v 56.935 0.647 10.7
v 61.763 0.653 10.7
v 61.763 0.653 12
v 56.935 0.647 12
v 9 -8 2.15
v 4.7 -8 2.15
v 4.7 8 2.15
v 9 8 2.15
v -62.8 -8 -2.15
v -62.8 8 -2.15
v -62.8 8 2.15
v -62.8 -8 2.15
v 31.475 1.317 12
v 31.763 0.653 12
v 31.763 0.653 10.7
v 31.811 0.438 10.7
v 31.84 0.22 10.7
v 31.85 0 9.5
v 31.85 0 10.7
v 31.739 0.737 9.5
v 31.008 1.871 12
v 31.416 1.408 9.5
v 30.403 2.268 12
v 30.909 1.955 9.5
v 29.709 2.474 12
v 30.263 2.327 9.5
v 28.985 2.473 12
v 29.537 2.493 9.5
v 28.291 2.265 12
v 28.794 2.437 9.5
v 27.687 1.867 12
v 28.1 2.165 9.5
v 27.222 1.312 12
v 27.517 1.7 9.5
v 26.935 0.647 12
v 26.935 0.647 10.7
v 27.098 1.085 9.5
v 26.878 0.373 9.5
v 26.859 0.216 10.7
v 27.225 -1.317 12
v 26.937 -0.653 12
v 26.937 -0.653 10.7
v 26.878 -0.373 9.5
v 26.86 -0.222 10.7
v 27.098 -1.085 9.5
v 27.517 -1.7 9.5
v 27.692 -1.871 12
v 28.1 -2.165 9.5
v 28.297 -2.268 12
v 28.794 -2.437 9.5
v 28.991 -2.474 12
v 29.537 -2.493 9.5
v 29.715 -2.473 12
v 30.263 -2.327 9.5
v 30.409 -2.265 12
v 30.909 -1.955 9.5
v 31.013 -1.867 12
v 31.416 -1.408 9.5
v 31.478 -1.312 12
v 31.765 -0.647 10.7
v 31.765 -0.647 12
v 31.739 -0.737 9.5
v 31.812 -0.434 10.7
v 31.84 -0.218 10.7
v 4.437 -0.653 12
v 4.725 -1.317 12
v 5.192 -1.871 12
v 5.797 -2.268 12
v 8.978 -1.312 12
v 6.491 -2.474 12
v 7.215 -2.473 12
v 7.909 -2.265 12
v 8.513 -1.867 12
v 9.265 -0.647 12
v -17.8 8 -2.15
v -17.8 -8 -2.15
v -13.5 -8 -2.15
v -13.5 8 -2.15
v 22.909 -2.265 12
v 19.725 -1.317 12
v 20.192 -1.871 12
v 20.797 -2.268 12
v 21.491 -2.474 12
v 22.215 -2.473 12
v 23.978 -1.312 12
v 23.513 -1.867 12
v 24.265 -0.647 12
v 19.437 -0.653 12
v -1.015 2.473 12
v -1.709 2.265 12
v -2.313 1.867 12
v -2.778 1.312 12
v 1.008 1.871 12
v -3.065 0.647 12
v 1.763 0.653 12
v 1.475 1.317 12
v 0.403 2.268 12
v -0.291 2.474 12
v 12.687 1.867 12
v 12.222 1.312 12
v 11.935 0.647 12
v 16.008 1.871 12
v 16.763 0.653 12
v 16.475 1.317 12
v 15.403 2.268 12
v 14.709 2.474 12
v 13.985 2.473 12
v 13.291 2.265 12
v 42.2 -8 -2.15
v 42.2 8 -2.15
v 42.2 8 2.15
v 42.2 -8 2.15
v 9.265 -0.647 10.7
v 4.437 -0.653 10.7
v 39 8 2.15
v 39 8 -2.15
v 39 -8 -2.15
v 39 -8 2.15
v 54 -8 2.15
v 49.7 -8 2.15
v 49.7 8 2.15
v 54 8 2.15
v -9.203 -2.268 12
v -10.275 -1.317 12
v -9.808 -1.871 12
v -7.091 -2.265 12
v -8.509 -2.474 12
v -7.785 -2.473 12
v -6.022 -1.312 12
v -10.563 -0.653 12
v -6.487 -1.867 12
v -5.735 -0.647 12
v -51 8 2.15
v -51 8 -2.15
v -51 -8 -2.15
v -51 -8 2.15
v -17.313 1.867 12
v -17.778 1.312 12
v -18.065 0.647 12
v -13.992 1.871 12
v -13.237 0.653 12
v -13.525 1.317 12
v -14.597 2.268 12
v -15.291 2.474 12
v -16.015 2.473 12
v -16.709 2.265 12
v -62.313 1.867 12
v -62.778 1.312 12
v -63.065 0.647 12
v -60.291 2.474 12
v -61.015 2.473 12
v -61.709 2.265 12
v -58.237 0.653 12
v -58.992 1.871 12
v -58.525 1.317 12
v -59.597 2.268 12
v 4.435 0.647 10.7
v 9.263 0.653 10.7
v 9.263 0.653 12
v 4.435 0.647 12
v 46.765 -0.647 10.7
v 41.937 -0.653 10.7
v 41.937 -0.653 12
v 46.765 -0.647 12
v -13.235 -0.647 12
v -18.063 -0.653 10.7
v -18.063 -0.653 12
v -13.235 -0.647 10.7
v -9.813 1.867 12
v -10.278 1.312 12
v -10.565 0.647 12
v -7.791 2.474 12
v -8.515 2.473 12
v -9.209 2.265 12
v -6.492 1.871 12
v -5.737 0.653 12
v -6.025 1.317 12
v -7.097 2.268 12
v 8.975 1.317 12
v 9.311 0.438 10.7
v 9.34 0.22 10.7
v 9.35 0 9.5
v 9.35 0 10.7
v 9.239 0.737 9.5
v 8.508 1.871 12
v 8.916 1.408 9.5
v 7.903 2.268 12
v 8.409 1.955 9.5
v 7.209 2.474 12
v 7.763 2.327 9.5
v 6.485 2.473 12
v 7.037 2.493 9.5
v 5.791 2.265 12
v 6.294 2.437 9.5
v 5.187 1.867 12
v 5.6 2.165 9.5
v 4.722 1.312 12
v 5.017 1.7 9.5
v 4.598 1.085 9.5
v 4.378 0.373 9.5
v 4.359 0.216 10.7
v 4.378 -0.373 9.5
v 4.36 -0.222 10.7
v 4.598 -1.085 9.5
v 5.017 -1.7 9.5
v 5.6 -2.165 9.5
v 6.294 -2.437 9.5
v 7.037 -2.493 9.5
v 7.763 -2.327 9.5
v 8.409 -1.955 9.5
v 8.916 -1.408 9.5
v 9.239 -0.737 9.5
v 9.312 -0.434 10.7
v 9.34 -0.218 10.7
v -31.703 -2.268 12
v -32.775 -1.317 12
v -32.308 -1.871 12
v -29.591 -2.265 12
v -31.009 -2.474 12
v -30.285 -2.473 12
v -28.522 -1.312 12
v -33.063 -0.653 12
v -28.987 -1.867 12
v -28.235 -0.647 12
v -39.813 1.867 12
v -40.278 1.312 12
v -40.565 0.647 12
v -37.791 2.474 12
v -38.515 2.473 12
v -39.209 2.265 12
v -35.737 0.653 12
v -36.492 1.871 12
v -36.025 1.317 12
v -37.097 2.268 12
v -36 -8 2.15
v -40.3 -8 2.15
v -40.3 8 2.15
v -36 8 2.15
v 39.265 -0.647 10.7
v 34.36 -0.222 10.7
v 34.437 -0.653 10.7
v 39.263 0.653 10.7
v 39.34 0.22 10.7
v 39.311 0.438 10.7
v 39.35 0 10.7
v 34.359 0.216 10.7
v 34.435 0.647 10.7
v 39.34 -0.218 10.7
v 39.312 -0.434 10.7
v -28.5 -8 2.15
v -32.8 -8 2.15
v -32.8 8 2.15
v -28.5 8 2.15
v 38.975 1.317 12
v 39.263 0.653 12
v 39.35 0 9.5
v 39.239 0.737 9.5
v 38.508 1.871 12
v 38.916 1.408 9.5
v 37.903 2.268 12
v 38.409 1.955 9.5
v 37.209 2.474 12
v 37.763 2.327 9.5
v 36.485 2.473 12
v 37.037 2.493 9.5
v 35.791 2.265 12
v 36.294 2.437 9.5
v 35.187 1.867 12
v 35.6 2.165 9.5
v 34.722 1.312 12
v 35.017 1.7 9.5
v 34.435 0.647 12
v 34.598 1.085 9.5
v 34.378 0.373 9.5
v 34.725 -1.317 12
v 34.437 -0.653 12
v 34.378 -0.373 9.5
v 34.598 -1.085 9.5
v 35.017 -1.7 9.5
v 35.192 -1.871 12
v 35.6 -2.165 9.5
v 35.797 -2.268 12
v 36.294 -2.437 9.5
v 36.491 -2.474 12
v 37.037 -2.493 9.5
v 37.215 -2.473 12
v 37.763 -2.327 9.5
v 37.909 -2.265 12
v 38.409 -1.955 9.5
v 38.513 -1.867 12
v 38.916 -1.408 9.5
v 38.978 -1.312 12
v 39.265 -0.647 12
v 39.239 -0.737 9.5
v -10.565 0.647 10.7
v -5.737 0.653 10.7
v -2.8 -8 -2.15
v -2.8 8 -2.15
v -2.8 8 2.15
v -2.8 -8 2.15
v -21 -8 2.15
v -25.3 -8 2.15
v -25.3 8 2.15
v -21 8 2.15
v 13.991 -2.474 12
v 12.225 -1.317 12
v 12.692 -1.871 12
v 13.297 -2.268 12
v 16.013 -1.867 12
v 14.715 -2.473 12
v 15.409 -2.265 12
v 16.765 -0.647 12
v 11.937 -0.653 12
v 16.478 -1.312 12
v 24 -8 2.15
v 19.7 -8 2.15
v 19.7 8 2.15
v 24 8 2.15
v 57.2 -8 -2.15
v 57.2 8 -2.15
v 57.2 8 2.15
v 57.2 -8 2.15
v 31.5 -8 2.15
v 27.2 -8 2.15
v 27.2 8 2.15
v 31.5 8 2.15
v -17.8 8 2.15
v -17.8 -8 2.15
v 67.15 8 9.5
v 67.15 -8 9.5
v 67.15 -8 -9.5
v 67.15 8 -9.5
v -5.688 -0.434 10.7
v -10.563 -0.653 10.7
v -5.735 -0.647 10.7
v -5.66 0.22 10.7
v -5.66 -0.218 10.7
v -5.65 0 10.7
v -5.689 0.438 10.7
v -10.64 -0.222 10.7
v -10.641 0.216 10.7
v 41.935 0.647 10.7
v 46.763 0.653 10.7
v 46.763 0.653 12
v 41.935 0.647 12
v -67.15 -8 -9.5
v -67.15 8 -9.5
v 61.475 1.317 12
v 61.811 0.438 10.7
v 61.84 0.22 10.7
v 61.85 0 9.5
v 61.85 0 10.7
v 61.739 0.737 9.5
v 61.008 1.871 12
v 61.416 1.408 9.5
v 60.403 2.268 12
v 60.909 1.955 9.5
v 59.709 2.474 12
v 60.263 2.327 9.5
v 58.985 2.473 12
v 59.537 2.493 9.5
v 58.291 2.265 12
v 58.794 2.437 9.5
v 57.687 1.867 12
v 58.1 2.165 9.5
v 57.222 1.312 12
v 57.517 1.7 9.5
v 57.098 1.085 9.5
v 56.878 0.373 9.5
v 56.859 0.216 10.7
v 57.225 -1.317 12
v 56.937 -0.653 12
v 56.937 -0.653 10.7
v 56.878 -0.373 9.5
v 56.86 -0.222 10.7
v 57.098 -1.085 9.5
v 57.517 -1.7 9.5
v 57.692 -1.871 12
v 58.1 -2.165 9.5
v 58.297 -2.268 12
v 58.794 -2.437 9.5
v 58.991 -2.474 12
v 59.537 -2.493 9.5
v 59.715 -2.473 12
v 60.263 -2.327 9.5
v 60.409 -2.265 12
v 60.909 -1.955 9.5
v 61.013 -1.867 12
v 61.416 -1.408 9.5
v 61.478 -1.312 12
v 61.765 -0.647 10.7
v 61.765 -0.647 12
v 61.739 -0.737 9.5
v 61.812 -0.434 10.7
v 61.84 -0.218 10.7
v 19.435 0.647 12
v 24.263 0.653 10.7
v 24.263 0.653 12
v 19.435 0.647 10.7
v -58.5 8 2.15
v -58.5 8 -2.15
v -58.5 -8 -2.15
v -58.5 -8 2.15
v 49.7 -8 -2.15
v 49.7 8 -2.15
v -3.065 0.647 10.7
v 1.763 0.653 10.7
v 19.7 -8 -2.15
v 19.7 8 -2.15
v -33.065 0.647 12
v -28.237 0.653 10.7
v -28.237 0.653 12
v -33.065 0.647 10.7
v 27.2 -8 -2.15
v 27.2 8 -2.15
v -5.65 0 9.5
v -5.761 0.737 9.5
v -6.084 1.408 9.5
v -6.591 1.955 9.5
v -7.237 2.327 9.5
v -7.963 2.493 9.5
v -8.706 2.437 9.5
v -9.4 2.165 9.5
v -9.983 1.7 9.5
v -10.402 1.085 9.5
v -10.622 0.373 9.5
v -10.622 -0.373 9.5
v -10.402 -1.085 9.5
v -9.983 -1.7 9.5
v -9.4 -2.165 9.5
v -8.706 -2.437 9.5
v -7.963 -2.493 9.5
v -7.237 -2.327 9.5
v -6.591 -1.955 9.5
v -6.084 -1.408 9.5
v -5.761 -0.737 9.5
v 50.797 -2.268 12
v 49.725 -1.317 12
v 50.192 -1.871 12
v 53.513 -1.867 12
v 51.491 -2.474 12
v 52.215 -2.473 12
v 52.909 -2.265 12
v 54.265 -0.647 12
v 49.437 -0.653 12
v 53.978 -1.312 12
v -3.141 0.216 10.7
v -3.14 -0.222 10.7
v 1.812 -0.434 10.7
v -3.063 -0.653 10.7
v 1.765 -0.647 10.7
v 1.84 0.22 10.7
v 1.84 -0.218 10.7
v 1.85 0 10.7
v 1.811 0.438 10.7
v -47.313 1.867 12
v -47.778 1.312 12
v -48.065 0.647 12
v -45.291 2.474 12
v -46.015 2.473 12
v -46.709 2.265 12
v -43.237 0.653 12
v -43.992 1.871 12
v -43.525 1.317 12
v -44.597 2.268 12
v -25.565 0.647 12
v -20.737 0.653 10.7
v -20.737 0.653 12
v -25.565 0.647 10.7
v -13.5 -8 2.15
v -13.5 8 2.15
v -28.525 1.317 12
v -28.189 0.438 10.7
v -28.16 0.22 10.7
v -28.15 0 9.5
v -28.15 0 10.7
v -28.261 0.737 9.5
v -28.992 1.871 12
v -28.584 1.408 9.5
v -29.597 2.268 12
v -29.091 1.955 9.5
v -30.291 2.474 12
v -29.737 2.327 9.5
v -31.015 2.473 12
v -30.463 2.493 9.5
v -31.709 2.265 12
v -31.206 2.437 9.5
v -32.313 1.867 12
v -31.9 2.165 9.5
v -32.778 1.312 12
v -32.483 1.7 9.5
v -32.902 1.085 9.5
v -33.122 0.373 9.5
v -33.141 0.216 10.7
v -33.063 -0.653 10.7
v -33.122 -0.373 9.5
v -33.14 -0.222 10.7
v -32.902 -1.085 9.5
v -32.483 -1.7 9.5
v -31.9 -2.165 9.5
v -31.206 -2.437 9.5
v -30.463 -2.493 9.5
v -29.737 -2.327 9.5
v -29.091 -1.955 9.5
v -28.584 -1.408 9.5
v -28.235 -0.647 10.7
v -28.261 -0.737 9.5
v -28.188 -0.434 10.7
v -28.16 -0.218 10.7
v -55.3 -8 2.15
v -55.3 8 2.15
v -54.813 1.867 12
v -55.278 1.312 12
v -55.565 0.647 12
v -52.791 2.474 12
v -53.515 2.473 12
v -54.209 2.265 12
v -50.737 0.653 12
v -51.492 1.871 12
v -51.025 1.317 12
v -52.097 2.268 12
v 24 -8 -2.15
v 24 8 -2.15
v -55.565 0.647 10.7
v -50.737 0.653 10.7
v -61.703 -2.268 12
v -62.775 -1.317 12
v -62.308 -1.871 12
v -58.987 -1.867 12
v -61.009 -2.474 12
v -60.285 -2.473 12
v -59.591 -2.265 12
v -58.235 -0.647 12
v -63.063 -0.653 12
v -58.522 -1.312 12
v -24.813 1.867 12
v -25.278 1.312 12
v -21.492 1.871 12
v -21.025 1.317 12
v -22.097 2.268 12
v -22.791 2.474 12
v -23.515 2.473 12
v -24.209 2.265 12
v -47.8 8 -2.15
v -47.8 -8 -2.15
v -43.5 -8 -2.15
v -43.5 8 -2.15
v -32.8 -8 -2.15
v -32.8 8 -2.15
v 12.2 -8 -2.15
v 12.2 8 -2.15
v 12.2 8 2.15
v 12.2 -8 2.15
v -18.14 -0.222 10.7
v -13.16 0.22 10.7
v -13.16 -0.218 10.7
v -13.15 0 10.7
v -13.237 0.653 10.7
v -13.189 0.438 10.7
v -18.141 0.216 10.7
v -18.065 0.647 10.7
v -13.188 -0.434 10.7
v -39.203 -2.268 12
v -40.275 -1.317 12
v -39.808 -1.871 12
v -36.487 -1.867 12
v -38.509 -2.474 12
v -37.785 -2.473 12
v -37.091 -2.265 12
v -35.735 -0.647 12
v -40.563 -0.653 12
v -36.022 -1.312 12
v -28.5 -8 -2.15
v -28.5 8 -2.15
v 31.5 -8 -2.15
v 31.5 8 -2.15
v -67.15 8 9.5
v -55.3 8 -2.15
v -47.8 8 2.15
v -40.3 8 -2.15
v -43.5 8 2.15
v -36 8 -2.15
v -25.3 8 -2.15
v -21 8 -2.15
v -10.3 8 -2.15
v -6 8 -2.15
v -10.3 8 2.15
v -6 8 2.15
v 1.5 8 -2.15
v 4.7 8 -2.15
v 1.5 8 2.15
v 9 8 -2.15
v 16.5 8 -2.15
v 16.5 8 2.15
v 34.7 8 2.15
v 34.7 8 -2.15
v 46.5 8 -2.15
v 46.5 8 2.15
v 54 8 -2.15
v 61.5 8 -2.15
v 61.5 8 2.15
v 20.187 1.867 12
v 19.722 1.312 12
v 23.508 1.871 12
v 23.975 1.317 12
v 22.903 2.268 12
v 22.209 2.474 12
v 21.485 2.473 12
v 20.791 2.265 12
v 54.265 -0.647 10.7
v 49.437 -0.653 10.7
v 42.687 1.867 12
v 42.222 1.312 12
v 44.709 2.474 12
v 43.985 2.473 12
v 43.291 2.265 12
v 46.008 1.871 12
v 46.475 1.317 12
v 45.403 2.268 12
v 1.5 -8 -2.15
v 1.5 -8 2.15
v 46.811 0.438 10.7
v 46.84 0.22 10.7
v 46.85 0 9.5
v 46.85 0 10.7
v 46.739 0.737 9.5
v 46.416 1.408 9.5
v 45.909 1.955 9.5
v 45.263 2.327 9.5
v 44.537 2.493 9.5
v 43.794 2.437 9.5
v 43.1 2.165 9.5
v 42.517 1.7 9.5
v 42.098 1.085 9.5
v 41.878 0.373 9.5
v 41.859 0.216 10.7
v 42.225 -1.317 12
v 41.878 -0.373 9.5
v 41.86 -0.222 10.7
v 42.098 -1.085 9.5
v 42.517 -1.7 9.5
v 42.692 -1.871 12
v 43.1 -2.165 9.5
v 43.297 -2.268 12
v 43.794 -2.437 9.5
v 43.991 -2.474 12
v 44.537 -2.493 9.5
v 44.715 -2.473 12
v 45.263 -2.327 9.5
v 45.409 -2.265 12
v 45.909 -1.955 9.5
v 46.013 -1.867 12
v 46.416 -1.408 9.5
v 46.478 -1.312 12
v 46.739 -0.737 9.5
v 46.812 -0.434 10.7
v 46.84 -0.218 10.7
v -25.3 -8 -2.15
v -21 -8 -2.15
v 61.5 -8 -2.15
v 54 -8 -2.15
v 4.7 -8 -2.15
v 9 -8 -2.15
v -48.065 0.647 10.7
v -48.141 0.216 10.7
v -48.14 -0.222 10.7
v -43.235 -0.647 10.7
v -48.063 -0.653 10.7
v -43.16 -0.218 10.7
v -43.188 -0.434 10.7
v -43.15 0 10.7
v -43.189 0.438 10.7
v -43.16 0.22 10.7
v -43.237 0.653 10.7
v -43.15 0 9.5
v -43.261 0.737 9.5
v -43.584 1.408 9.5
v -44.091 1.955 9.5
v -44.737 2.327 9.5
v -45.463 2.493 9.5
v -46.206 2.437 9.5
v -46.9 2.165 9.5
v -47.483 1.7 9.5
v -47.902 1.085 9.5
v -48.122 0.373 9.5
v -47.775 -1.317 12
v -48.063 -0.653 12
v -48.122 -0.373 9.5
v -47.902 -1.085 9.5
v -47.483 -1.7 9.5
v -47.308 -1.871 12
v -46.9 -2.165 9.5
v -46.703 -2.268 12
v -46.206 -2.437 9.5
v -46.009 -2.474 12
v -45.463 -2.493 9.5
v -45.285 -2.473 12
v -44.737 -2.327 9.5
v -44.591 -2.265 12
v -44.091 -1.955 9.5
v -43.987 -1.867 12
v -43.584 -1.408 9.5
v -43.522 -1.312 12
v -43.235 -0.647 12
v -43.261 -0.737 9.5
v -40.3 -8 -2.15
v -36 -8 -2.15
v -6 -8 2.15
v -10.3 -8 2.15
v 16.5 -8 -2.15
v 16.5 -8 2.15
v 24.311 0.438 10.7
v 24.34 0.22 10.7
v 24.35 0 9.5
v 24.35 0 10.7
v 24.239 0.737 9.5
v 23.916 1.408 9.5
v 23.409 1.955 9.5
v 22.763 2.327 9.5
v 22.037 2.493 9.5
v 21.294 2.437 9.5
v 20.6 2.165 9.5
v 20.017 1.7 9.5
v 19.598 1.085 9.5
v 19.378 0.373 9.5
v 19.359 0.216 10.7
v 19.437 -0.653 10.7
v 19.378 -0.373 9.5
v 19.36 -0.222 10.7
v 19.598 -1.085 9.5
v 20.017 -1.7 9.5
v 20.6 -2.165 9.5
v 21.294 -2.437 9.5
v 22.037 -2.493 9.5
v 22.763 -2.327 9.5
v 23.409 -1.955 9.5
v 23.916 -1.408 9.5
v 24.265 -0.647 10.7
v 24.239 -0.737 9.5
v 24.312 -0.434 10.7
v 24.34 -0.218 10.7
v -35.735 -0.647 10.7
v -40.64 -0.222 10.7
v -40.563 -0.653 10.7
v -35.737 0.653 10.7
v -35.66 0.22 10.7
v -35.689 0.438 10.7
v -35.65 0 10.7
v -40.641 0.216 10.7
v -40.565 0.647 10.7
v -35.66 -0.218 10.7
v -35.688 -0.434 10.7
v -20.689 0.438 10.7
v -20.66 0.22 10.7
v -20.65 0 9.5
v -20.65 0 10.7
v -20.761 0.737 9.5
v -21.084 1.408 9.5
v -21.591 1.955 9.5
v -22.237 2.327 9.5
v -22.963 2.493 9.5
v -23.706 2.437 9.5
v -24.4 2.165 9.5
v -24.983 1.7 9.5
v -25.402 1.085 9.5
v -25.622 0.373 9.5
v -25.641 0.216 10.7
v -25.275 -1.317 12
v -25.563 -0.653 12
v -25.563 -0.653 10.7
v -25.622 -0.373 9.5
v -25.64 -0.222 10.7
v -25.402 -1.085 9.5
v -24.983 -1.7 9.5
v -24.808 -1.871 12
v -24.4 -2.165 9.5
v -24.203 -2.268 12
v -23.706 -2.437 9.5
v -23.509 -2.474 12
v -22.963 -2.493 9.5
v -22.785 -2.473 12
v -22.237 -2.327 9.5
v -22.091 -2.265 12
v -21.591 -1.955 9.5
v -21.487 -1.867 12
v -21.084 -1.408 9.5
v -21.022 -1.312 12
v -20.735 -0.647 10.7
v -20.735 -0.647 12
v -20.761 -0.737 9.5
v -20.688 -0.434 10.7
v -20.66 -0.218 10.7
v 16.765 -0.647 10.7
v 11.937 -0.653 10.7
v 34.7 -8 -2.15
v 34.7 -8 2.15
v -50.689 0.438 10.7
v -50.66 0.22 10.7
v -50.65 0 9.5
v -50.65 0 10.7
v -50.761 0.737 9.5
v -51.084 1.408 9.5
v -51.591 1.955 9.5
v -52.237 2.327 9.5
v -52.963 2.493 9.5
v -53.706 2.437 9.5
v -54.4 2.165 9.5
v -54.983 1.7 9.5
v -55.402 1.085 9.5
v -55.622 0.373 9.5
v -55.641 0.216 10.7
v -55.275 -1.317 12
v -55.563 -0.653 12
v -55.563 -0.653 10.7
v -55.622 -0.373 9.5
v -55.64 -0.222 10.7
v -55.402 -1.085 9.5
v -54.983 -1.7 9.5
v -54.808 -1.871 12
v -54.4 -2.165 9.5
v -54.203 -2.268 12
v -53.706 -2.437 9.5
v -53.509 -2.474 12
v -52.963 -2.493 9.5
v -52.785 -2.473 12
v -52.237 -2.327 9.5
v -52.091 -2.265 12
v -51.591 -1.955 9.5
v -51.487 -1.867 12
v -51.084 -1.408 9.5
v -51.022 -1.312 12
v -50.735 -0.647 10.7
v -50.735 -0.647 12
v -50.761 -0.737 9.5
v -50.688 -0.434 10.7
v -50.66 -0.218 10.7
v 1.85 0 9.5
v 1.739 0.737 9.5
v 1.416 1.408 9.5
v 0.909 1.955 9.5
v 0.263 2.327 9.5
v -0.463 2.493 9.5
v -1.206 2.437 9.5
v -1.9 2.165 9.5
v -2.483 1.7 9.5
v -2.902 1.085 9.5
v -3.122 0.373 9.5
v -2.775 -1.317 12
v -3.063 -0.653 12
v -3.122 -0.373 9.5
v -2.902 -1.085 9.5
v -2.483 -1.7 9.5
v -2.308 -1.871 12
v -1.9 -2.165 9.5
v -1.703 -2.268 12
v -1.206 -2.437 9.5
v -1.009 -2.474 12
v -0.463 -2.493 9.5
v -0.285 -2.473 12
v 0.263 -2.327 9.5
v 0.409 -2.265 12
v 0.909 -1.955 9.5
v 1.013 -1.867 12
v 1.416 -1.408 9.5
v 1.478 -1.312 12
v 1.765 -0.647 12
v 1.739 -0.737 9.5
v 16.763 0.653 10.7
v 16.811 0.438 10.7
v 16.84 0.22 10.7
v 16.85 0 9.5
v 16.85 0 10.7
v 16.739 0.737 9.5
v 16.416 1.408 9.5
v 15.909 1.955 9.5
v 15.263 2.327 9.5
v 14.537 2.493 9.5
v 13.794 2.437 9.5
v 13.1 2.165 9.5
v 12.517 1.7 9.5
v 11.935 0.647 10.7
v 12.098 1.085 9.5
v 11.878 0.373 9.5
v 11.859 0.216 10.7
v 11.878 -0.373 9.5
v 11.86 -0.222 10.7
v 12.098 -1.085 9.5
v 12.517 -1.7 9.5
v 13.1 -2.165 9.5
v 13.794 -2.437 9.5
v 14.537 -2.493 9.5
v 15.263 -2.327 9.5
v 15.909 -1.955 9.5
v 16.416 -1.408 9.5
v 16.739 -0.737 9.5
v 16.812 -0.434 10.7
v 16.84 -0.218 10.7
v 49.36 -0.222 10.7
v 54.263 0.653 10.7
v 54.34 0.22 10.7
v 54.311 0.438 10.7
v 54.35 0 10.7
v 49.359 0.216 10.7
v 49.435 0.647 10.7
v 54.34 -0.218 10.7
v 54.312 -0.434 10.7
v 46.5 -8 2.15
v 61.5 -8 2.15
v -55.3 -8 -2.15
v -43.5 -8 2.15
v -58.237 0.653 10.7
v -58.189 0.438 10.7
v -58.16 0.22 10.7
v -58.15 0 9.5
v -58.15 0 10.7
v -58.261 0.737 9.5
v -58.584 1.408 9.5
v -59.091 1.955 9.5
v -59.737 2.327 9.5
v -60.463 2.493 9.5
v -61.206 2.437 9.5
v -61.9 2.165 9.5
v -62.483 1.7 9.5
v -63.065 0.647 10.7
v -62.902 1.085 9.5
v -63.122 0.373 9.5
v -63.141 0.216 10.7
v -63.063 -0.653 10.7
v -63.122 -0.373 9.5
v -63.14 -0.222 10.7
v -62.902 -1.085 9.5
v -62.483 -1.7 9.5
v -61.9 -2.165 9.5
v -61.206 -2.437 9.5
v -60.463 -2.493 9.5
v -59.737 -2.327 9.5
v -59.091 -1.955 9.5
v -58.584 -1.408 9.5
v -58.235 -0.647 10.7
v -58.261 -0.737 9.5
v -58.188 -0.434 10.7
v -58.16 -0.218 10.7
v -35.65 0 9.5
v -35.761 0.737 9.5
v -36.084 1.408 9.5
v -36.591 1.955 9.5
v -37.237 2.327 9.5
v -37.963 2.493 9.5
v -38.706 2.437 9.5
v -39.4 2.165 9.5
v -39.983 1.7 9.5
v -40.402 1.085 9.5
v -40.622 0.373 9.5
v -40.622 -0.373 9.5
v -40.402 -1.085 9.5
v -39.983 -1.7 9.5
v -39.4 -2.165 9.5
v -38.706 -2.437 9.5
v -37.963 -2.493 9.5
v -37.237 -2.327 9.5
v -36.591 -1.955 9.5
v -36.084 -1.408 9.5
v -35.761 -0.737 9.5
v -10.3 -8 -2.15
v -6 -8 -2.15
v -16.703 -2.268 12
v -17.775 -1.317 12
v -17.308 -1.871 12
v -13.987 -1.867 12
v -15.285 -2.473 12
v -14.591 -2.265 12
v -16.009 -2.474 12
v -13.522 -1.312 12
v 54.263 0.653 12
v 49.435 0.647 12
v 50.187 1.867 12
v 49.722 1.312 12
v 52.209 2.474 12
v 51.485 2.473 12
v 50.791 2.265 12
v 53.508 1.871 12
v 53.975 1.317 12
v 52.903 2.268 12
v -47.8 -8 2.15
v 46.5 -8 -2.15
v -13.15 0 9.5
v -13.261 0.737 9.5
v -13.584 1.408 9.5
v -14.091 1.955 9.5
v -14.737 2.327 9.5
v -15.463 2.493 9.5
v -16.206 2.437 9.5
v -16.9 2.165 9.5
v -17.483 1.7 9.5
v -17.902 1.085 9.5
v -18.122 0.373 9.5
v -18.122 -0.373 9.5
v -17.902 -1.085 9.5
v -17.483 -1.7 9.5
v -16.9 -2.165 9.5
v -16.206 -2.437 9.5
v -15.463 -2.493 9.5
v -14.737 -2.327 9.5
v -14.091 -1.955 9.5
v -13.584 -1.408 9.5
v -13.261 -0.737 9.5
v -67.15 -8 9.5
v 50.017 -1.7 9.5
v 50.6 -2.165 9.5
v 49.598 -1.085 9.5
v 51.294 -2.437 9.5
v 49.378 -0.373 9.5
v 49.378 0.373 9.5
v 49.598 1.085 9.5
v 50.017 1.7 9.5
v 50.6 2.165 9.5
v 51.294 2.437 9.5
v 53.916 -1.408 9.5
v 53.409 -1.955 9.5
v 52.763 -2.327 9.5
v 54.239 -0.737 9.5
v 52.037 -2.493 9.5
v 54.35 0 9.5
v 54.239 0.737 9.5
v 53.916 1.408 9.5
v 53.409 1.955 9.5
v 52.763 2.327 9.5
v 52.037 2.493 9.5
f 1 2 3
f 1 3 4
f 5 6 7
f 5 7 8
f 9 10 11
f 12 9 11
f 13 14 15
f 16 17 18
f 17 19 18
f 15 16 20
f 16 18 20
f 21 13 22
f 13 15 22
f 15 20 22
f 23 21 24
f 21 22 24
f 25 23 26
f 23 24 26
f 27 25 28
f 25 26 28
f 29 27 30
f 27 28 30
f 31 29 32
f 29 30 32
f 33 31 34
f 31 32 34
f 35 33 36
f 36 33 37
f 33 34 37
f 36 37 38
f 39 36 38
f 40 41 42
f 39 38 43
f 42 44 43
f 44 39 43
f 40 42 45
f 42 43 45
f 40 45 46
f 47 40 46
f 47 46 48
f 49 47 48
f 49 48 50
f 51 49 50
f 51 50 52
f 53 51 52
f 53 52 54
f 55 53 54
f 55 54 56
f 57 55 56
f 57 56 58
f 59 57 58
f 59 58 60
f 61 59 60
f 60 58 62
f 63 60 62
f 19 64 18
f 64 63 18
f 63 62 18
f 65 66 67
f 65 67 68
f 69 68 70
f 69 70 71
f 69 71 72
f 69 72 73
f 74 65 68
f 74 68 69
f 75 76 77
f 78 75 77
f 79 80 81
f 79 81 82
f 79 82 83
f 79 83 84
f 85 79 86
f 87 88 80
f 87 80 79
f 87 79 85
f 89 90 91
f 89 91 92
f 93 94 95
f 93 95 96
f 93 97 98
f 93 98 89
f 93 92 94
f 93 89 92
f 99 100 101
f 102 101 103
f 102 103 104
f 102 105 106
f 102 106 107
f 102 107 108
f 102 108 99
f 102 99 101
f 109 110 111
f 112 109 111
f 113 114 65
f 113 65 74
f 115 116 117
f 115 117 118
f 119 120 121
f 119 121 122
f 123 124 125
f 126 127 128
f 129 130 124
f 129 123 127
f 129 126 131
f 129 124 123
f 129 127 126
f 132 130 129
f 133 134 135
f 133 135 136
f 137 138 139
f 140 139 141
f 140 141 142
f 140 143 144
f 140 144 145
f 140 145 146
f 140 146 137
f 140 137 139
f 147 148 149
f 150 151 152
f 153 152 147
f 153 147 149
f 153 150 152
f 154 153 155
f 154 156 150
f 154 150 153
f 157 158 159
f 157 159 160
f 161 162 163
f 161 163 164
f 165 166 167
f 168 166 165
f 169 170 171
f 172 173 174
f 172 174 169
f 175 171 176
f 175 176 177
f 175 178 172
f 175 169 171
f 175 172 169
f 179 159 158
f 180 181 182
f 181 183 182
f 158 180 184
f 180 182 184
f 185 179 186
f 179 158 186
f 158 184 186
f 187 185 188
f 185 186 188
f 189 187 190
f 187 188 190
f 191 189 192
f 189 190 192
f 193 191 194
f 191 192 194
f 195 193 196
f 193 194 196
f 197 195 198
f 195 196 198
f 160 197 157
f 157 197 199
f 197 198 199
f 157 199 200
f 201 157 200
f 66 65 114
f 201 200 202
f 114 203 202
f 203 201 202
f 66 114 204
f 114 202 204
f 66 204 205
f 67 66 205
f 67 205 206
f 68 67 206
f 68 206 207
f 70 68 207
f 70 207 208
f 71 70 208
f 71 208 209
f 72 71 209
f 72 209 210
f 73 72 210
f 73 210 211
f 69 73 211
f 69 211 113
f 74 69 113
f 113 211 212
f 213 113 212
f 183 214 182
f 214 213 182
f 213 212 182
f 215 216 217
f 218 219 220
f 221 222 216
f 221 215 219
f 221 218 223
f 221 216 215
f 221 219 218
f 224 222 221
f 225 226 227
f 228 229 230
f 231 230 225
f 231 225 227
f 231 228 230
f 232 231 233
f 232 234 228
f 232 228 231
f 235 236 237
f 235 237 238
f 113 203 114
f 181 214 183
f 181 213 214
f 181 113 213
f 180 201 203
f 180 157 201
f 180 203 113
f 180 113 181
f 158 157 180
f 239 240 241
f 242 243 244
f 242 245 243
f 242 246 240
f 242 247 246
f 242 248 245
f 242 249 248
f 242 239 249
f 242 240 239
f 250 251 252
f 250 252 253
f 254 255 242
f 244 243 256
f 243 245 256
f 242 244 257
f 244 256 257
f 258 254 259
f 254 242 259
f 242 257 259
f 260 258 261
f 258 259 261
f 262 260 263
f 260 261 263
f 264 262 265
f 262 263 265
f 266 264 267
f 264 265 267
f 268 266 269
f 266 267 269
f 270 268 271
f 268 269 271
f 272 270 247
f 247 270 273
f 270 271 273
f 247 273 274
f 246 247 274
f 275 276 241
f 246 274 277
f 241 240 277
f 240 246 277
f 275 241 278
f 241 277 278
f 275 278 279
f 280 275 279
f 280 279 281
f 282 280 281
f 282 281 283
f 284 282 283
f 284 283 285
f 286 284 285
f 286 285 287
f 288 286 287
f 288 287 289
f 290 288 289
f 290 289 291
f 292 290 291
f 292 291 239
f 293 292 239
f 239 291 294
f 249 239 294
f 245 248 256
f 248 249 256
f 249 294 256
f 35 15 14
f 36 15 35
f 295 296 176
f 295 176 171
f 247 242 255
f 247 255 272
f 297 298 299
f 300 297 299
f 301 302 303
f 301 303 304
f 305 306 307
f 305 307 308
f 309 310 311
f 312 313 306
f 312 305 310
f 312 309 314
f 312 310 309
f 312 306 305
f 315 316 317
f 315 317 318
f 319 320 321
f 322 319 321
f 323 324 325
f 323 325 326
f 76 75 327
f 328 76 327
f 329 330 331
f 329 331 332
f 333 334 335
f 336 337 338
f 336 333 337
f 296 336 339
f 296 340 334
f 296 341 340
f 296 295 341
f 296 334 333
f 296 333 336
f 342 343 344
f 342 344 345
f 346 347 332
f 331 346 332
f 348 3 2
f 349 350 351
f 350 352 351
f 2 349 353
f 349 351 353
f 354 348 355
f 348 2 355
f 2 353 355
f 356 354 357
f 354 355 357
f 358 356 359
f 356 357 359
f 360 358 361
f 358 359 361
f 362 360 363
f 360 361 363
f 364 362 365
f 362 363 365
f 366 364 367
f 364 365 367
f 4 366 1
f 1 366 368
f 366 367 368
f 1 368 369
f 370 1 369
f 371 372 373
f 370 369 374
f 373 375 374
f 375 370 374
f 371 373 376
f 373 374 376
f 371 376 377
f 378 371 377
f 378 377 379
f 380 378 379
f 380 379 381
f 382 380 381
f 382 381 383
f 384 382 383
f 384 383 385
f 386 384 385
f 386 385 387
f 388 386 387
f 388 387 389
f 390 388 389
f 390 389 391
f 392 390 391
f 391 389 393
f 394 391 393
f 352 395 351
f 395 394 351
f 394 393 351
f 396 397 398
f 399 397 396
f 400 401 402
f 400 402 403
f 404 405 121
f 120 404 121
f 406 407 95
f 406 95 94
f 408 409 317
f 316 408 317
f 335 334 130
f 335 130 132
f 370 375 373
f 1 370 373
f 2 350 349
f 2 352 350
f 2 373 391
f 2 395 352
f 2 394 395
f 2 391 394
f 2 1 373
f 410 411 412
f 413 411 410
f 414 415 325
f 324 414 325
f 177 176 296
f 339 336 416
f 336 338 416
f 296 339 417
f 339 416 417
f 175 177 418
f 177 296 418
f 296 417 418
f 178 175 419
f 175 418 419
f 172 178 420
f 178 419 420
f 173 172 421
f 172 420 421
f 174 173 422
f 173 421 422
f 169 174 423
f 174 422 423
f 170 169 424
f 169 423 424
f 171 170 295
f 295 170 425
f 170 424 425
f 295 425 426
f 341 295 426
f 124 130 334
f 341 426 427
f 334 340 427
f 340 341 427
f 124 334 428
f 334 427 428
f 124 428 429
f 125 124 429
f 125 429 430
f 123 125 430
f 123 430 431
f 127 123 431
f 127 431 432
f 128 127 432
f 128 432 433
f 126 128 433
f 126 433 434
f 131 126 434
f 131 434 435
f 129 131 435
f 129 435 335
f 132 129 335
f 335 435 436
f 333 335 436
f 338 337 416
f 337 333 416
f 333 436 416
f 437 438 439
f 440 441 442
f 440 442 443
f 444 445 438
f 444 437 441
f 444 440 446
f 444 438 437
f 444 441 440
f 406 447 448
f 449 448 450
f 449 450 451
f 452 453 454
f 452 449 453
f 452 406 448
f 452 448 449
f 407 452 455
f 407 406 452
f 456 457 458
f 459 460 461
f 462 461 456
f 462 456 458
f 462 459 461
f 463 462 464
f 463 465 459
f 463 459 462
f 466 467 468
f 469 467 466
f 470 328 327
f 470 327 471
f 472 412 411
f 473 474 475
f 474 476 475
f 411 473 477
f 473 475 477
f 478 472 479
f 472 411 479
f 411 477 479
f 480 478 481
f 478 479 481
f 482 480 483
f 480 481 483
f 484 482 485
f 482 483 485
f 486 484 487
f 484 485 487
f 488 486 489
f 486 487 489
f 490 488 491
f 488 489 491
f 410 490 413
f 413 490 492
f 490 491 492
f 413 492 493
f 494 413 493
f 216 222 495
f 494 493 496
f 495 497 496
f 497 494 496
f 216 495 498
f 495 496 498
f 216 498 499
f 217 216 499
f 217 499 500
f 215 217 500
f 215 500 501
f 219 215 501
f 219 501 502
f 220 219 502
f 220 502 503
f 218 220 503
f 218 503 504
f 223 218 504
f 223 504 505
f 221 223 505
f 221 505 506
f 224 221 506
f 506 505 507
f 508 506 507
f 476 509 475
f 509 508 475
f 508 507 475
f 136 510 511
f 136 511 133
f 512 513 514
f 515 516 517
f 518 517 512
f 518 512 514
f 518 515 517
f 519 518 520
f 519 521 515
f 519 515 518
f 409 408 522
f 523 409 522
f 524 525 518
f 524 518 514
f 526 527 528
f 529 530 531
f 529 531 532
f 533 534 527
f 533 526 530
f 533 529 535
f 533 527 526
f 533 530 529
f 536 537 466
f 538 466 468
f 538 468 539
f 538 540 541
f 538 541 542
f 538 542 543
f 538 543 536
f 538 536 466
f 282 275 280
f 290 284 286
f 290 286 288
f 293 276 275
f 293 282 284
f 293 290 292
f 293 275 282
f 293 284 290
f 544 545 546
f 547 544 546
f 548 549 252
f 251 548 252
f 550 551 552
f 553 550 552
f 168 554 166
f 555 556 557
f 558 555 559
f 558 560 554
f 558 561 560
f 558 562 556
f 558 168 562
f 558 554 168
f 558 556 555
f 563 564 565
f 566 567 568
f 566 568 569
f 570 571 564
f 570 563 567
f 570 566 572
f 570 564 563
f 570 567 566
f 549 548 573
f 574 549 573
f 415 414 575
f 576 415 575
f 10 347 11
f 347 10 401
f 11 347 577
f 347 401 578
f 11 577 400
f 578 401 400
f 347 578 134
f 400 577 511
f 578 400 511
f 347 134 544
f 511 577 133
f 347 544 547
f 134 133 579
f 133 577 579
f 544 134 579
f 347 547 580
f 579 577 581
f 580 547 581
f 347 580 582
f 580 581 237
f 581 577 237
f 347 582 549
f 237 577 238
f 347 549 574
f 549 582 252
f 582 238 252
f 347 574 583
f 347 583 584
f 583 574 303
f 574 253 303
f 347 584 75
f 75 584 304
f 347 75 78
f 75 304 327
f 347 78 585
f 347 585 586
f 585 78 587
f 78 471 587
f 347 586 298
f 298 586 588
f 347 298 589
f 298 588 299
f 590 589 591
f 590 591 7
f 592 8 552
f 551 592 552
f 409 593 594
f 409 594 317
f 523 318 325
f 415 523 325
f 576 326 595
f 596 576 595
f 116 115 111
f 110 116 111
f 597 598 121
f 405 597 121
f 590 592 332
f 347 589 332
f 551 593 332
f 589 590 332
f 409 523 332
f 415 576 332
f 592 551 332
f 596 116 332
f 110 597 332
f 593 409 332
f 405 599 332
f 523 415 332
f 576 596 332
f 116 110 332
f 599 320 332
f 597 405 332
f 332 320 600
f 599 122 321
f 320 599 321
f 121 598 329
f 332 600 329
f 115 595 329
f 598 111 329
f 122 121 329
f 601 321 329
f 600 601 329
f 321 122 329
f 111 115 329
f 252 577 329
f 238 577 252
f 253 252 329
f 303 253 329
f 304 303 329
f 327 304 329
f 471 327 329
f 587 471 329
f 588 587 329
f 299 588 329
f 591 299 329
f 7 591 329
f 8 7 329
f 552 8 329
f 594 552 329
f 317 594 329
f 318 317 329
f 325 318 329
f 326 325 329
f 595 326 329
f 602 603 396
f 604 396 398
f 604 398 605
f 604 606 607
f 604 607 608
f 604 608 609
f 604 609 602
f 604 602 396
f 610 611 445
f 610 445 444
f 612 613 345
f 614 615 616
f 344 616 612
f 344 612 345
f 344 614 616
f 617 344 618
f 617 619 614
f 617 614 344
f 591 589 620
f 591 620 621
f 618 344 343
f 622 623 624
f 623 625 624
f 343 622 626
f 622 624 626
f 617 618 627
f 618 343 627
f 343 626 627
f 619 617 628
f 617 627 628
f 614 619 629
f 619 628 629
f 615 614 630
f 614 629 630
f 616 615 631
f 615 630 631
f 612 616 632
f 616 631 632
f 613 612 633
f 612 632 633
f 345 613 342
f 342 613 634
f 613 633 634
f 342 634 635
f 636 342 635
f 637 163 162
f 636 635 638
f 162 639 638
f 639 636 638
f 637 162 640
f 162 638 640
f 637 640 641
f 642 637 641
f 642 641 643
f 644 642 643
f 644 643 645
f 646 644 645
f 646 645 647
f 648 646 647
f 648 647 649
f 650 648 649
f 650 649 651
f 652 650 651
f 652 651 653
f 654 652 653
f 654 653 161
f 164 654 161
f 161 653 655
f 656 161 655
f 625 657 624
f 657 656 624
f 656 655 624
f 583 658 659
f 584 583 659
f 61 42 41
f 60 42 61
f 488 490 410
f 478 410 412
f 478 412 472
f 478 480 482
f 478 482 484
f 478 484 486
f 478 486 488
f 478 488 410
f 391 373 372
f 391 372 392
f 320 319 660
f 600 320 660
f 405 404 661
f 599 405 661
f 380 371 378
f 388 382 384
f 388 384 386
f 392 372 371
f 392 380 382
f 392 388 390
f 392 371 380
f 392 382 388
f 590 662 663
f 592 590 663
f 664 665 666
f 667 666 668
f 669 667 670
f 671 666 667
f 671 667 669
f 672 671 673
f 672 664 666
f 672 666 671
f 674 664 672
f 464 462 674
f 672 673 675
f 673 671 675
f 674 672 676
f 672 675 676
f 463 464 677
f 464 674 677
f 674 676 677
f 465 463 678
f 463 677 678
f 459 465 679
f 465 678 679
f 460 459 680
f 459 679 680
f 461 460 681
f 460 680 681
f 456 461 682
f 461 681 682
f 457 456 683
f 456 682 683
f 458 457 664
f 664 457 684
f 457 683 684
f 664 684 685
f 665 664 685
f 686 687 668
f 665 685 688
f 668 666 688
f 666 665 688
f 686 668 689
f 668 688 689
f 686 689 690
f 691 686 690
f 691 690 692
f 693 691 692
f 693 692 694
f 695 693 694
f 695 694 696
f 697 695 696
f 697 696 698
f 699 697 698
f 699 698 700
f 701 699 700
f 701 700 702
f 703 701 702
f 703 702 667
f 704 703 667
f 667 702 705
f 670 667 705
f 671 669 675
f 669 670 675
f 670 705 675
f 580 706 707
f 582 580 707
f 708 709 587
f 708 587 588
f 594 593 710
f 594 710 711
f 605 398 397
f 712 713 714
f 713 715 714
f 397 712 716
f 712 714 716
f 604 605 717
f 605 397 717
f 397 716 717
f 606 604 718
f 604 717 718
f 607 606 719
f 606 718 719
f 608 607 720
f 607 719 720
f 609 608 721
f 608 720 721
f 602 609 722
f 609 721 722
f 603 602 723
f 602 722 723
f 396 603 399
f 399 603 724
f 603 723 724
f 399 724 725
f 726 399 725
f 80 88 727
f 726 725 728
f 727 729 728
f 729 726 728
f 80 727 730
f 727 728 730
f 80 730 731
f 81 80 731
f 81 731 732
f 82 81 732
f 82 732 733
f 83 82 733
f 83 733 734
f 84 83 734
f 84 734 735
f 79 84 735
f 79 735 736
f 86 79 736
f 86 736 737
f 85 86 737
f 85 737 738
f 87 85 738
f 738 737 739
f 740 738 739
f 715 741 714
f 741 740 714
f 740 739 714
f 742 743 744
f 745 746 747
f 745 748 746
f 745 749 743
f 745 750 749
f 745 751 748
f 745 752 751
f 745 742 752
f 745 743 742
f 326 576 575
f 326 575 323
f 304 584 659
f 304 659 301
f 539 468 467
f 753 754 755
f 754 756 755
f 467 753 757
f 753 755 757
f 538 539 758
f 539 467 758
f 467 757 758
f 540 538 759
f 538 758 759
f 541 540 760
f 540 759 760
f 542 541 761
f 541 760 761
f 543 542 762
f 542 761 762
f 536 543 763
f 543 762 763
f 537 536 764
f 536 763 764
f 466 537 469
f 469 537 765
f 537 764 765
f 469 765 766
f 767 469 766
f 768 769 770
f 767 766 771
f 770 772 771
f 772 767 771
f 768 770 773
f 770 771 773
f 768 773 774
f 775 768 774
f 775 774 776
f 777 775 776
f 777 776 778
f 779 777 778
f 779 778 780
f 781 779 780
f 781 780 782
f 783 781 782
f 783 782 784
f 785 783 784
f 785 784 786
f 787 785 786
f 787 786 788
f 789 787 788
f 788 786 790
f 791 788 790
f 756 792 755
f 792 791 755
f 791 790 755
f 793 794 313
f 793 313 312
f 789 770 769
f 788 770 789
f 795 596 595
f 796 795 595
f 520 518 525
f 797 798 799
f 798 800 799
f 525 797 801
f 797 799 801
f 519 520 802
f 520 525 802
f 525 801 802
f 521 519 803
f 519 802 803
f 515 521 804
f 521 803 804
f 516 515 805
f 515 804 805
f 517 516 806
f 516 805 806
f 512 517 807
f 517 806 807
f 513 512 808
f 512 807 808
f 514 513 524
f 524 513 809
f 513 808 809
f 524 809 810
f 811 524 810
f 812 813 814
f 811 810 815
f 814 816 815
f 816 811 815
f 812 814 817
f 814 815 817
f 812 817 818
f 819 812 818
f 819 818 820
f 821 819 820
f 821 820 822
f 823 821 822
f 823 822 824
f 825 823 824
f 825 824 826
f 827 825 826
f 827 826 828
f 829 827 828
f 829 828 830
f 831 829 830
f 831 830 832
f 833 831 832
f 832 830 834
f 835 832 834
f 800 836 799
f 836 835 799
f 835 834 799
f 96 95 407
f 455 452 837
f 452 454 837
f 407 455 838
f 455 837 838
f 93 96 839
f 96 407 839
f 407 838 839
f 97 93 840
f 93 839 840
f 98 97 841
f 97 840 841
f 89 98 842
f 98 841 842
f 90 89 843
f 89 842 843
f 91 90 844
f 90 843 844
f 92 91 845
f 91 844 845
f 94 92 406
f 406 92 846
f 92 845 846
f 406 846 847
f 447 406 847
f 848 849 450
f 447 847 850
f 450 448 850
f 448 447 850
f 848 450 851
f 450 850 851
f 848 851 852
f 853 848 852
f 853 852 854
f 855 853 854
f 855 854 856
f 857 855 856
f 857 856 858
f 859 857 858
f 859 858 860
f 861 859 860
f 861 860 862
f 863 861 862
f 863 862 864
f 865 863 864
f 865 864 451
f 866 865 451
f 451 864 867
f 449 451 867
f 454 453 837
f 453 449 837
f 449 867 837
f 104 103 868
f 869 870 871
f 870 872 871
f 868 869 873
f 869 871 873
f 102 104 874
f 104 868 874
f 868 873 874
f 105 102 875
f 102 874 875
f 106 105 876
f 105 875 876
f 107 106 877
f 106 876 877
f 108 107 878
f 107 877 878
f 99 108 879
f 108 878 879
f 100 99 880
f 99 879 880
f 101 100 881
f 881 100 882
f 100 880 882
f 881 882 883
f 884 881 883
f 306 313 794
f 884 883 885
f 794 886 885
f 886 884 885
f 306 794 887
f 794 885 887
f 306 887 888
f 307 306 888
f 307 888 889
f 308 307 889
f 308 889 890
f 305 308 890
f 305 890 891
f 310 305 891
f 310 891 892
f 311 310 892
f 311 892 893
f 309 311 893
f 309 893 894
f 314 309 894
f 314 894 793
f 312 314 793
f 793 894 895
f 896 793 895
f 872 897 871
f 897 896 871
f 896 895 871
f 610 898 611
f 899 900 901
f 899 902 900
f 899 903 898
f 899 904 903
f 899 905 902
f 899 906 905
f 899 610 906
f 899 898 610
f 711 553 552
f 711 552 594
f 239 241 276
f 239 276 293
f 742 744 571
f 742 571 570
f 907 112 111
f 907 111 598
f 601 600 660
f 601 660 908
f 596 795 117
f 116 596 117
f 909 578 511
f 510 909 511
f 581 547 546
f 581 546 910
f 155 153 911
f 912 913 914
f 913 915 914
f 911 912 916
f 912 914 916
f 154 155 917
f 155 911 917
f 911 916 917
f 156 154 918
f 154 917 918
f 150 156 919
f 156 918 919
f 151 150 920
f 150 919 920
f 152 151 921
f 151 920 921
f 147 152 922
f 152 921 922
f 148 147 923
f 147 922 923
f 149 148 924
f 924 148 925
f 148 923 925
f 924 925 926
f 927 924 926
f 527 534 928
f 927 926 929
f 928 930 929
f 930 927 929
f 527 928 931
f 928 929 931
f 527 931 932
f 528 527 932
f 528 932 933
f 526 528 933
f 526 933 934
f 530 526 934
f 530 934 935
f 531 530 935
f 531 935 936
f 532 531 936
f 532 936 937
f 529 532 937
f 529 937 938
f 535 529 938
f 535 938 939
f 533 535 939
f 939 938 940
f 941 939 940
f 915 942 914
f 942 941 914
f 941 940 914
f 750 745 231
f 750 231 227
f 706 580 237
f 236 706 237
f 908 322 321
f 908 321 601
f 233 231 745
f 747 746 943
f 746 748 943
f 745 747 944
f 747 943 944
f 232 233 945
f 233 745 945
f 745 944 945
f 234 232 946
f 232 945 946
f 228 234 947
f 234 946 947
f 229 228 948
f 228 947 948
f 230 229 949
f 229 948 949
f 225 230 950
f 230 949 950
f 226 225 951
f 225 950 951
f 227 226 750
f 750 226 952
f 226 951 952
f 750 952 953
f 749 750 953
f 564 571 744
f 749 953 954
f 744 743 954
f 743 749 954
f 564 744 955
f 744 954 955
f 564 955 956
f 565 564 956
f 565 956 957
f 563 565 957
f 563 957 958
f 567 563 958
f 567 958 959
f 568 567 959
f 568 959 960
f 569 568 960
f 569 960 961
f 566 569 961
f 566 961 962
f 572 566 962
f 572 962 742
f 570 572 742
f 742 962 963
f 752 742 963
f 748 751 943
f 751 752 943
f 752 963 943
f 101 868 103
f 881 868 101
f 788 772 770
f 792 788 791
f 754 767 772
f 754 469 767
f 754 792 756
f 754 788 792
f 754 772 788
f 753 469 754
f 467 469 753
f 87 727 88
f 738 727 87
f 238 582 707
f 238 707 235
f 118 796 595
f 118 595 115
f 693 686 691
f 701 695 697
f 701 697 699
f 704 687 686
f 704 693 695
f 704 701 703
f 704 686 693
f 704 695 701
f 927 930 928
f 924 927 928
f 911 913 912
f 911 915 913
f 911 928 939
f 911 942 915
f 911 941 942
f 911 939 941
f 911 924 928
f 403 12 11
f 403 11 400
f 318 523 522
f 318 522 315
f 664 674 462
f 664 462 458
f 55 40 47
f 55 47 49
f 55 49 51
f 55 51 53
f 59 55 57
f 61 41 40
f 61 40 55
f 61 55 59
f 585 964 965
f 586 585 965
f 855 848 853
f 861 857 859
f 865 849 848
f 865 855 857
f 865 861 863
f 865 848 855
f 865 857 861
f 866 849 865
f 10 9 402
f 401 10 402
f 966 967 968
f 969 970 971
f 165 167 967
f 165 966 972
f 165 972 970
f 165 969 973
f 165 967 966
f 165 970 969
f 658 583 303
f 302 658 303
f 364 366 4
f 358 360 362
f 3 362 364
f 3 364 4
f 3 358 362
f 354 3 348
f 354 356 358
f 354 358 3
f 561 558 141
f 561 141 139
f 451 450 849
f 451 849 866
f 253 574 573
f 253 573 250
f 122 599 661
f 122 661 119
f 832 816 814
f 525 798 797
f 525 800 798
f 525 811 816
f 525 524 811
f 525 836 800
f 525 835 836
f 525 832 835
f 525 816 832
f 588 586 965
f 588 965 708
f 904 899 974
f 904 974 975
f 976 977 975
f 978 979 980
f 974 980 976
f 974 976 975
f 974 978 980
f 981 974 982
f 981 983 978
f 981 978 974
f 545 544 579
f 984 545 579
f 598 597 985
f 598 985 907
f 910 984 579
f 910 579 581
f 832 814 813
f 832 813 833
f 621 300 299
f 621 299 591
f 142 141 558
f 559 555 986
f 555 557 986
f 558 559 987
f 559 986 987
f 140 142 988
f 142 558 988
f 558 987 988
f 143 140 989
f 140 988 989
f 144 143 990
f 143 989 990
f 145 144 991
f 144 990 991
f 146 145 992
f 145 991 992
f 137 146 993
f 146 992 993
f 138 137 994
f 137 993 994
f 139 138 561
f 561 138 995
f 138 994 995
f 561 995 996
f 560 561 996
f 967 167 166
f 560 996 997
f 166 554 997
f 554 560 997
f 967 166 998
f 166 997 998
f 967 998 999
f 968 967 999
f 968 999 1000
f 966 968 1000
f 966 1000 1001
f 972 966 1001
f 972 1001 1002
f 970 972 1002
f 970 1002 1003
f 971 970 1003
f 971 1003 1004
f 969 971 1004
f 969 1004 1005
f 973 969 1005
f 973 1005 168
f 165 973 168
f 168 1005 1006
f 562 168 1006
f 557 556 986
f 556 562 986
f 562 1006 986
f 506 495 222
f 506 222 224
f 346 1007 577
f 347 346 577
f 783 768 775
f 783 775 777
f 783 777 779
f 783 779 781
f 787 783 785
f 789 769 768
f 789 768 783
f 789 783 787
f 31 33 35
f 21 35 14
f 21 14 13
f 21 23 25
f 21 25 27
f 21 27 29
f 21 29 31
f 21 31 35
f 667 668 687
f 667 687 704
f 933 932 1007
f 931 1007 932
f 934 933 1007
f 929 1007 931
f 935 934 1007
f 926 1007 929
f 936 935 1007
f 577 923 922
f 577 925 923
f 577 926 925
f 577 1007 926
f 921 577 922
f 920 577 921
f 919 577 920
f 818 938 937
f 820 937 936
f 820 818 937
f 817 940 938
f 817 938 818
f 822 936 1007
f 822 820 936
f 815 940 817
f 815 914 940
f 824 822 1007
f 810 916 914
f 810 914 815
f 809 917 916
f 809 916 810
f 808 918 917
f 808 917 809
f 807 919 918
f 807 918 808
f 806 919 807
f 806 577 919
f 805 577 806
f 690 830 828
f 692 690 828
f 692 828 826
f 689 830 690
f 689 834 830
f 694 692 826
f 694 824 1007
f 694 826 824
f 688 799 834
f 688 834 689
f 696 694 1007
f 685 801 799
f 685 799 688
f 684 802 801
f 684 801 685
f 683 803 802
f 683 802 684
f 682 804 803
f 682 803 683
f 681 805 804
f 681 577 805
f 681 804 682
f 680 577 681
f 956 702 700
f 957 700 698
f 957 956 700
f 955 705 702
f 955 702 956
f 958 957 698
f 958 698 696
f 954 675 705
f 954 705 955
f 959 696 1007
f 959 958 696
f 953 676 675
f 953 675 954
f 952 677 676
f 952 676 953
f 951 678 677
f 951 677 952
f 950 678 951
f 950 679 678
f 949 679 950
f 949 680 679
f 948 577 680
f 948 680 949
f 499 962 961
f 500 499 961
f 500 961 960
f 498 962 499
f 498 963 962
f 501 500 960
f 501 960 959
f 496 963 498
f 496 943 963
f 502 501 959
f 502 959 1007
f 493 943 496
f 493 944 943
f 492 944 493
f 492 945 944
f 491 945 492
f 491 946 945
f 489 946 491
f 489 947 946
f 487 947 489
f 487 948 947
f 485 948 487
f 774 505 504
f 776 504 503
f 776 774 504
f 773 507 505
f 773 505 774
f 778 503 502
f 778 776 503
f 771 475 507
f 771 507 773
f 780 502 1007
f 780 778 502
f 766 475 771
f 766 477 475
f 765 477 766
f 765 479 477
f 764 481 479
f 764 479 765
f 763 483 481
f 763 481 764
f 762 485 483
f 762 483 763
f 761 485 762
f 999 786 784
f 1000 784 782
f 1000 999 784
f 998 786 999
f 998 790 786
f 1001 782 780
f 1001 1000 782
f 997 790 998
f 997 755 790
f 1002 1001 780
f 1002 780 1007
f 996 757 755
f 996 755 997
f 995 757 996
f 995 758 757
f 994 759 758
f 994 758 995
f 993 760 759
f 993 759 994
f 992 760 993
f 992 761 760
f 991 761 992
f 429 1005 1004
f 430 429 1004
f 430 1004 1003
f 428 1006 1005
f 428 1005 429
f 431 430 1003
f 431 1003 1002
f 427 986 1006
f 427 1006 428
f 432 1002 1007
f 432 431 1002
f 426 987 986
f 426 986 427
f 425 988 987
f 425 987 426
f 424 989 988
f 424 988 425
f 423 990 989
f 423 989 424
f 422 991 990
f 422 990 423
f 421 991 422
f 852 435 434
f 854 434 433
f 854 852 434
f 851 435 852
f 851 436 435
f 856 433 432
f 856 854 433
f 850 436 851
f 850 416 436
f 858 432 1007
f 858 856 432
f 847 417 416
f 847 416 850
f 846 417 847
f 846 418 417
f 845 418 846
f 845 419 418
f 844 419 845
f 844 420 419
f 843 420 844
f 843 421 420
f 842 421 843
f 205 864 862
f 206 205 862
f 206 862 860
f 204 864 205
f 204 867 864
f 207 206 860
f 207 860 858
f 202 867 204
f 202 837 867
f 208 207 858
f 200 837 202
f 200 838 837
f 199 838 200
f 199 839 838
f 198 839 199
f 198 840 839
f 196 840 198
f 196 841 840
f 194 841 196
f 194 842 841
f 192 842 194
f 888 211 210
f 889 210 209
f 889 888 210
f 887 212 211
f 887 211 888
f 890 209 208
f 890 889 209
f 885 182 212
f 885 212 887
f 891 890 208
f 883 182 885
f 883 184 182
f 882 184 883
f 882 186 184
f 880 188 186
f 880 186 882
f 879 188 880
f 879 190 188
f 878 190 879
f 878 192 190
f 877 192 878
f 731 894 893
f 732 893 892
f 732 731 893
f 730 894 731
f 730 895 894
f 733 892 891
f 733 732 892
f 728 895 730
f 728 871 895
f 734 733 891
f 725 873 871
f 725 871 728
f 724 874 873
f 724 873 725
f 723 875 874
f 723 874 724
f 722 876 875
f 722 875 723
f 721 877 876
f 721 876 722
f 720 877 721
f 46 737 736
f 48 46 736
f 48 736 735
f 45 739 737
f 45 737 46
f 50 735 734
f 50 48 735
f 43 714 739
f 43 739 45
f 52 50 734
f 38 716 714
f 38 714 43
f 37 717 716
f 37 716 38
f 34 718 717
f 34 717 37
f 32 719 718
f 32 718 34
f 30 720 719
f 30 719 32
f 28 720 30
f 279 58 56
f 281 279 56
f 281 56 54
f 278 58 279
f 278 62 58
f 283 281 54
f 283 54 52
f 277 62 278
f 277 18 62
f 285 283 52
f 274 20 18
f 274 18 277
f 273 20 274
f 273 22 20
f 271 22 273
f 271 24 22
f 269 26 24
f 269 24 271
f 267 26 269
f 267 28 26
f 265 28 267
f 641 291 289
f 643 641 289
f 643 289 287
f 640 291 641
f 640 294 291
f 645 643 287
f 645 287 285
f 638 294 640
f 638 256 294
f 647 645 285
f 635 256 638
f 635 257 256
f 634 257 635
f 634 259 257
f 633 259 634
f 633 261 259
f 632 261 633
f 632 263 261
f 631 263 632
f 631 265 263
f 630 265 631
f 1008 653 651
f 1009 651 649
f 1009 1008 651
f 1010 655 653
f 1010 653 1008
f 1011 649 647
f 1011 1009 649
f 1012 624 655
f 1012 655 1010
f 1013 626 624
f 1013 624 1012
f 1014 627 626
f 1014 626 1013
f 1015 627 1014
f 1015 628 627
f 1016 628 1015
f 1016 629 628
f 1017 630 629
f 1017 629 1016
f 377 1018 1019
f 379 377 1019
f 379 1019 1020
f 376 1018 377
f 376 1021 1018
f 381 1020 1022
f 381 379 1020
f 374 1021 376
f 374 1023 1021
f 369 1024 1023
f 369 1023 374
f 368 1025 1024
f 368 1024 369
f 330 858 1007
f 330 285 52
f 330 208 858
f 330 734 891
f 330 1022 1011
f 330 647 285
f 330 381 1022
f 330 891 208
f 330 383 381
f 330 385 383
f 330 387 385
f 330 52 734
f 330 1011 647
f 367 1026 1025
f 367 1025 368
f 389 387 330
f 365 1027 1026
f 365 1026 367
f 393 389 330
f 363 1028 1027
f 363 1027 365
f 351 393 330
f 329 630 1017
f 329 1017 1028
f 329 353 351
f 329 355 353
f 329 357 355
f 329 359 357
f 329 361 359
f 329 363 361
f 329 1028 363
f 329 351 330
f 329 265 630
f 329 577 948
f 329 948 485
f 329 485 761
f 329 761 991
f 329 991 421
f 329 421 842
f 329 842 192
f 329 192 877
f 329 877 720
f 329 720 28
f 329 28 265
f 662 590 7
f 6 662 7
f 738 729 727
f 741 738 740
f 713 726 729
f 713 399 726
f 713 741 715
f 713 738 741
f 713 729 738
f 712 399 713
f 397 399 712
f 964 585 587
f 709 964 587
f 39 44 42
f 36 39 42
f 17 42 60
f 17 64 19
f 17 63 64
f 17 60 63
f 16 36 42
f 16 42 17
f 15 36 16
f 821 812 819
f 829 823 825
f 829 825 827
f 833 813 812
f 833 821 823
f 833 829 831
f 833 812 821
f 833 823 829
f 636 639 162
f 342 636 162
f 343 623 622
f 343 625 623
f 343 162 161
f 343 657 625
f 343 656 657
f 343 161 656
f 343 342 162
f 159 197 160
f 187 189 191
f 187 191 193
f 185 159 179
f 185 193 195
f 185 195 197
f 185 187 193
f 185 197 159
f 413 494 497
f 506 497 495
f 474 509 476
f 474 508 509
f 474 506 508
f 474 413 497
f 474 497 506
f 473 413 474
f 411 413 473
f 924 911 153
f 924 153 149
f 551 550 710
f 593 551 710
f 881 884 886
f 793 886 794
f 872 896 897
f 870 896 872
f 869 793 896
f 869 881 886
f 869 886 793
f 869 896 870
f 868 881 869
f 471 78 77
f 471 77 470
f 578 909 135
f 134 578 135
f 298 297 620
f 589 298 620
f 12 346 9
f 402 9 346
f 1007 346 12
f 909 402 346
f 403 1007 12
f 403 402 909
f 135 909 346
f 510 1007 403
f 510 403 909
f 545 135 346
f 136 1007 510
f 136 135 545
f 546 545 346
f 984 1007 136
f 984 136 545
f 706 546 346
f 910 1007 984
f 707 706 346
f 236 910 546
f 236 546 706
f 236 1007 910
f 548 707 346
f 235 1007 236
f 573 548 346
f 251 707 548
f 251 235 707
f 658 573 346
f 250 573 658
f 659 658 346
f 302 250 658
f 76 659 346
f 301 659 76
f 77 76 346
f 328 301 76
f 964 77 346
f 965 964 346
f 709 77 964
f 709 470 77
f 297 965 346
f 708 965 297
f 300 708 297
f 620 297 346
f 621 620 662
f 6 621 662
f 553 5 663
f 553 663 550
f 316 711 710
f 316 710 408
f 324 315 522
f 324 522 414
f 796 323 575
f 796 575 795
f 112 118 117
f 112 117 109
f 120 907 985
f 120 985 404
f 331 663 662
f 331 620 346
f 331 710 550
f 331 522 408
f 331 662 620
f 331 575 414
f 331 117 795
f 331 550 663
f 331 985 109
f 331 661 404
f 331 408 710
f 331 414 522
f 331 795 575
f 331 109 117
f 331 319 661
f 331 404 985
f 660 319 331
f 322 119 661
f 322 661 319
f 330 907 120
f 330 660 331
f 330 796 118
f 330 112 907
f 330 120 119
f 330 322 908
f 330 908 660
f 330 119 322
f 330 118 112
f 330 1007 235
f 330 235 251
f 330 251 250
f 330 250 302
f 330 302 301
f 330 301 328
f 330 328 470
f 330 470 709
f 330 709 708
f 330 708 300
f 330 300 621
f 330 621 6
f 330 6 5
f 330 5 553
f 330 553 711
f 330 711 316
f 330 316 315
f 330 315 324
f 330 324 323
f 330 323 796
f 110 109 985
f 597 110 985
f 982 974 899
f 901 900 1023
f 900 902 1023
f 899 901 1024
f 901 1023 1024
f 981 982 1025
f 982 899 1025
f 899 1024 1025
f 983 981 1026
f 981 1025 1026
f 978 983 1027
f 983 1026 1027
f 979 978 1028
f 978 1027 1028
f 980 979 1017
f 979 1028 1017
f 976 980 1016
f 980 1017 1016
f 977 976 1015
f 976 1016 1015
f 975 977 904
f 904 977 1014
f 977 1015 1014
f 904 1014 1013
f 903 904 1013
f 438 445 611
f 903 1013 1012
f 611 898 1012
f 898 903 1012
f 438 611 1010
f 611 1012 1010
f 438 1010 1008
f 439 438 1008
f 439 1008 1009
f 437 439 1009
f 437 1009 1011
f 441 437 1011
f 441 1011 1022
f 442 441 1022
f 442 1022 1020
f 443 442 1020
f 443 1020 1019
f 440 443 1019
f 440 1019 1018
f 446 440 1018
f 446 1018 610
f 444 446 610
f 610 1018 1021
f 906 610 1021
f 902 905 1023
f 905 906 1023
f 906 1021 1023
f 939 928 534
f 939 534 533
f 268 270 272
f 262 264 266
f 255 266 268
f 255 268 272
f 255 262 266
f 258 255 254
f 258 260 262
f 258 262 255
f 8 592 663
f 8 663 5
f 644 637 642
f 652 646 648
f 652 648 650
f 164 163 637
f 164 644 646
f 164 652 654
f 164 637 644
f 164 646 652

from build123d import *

# Parameters (mm, degrees)
SKETCH1_W        = 134.3
SKETCH1_H        = 16
STRIP_BASE_DEPTH = 9.5
SKETCH2_R        = 2.5
SCREW_BODY_DEPTH = 2.5
SCREW_START      = -1.3
SCREW_SLOT_DEPTH = 3.8
SKETCH4_W        = 4.3
SKETCH4_H        = 4.3
WIRE_HOLE_DEPTH  = 71.065130414
LPATTERN1_COUNT  = 17
LPATTERN1_PITCH  = 7.5


with BuildPart() as part:
    # Sketch1 → strip base (new, symmetric)
    with BuildSketch(Plane.XY):
        Rectangle(SKETCH1_W, SKETCH1_H)
    extrude(amount=STRIP_BASE_DEPTH, both=True)

    # Sketch2 → screw body (add)
    with BuildSketch(Plane.XY.offset(9.5)):
        with Locations((-60.65, 0)):
            Circle(SKETCH2_R)
    screw_body = extrude(amount=SCREW_BODY_DEPTH)

    # Sketch3 → screw slot (cut)
    with BuildSketch(Plane.XY.offset(12).offset(SCREW_START)):
        Polygon((-58.150833414, 0.653197042), (-63.150829324, 0.646801894), (-63.149166586, -0.653197042), (-58.149170676, -0.646801894), align=None)
    screw_slot = extrude(amount=SCREW_SLOT_DEPTH, mode=Mode.SUBTRACT)

    # Sketch4 → wire hole (cut, through all)
    with BuildSketch(Plane.XZ.offset(8)):
        with Locations((-60.65, 0)):
            Rectangle(SKETCH4_W, SKETCH4_H)
    wire_hole = extrude(amount=-WIRE_HOLE_DEPTH, mode=Mode.SUBTRACT)

    # LPattern1: screw body, screw slot, wire hole ×17
    with Locations(*[(i * LPATTERN1_PITCH, 0, 0) for i in range(1, LPATTERN1_COUNT)]):
        add(screw_body)
        add(screw_slot, mode=Mode.SUBTRACT)
        add(wire_hole, mode=Mode.SUBTRACT)


solid = part.part
